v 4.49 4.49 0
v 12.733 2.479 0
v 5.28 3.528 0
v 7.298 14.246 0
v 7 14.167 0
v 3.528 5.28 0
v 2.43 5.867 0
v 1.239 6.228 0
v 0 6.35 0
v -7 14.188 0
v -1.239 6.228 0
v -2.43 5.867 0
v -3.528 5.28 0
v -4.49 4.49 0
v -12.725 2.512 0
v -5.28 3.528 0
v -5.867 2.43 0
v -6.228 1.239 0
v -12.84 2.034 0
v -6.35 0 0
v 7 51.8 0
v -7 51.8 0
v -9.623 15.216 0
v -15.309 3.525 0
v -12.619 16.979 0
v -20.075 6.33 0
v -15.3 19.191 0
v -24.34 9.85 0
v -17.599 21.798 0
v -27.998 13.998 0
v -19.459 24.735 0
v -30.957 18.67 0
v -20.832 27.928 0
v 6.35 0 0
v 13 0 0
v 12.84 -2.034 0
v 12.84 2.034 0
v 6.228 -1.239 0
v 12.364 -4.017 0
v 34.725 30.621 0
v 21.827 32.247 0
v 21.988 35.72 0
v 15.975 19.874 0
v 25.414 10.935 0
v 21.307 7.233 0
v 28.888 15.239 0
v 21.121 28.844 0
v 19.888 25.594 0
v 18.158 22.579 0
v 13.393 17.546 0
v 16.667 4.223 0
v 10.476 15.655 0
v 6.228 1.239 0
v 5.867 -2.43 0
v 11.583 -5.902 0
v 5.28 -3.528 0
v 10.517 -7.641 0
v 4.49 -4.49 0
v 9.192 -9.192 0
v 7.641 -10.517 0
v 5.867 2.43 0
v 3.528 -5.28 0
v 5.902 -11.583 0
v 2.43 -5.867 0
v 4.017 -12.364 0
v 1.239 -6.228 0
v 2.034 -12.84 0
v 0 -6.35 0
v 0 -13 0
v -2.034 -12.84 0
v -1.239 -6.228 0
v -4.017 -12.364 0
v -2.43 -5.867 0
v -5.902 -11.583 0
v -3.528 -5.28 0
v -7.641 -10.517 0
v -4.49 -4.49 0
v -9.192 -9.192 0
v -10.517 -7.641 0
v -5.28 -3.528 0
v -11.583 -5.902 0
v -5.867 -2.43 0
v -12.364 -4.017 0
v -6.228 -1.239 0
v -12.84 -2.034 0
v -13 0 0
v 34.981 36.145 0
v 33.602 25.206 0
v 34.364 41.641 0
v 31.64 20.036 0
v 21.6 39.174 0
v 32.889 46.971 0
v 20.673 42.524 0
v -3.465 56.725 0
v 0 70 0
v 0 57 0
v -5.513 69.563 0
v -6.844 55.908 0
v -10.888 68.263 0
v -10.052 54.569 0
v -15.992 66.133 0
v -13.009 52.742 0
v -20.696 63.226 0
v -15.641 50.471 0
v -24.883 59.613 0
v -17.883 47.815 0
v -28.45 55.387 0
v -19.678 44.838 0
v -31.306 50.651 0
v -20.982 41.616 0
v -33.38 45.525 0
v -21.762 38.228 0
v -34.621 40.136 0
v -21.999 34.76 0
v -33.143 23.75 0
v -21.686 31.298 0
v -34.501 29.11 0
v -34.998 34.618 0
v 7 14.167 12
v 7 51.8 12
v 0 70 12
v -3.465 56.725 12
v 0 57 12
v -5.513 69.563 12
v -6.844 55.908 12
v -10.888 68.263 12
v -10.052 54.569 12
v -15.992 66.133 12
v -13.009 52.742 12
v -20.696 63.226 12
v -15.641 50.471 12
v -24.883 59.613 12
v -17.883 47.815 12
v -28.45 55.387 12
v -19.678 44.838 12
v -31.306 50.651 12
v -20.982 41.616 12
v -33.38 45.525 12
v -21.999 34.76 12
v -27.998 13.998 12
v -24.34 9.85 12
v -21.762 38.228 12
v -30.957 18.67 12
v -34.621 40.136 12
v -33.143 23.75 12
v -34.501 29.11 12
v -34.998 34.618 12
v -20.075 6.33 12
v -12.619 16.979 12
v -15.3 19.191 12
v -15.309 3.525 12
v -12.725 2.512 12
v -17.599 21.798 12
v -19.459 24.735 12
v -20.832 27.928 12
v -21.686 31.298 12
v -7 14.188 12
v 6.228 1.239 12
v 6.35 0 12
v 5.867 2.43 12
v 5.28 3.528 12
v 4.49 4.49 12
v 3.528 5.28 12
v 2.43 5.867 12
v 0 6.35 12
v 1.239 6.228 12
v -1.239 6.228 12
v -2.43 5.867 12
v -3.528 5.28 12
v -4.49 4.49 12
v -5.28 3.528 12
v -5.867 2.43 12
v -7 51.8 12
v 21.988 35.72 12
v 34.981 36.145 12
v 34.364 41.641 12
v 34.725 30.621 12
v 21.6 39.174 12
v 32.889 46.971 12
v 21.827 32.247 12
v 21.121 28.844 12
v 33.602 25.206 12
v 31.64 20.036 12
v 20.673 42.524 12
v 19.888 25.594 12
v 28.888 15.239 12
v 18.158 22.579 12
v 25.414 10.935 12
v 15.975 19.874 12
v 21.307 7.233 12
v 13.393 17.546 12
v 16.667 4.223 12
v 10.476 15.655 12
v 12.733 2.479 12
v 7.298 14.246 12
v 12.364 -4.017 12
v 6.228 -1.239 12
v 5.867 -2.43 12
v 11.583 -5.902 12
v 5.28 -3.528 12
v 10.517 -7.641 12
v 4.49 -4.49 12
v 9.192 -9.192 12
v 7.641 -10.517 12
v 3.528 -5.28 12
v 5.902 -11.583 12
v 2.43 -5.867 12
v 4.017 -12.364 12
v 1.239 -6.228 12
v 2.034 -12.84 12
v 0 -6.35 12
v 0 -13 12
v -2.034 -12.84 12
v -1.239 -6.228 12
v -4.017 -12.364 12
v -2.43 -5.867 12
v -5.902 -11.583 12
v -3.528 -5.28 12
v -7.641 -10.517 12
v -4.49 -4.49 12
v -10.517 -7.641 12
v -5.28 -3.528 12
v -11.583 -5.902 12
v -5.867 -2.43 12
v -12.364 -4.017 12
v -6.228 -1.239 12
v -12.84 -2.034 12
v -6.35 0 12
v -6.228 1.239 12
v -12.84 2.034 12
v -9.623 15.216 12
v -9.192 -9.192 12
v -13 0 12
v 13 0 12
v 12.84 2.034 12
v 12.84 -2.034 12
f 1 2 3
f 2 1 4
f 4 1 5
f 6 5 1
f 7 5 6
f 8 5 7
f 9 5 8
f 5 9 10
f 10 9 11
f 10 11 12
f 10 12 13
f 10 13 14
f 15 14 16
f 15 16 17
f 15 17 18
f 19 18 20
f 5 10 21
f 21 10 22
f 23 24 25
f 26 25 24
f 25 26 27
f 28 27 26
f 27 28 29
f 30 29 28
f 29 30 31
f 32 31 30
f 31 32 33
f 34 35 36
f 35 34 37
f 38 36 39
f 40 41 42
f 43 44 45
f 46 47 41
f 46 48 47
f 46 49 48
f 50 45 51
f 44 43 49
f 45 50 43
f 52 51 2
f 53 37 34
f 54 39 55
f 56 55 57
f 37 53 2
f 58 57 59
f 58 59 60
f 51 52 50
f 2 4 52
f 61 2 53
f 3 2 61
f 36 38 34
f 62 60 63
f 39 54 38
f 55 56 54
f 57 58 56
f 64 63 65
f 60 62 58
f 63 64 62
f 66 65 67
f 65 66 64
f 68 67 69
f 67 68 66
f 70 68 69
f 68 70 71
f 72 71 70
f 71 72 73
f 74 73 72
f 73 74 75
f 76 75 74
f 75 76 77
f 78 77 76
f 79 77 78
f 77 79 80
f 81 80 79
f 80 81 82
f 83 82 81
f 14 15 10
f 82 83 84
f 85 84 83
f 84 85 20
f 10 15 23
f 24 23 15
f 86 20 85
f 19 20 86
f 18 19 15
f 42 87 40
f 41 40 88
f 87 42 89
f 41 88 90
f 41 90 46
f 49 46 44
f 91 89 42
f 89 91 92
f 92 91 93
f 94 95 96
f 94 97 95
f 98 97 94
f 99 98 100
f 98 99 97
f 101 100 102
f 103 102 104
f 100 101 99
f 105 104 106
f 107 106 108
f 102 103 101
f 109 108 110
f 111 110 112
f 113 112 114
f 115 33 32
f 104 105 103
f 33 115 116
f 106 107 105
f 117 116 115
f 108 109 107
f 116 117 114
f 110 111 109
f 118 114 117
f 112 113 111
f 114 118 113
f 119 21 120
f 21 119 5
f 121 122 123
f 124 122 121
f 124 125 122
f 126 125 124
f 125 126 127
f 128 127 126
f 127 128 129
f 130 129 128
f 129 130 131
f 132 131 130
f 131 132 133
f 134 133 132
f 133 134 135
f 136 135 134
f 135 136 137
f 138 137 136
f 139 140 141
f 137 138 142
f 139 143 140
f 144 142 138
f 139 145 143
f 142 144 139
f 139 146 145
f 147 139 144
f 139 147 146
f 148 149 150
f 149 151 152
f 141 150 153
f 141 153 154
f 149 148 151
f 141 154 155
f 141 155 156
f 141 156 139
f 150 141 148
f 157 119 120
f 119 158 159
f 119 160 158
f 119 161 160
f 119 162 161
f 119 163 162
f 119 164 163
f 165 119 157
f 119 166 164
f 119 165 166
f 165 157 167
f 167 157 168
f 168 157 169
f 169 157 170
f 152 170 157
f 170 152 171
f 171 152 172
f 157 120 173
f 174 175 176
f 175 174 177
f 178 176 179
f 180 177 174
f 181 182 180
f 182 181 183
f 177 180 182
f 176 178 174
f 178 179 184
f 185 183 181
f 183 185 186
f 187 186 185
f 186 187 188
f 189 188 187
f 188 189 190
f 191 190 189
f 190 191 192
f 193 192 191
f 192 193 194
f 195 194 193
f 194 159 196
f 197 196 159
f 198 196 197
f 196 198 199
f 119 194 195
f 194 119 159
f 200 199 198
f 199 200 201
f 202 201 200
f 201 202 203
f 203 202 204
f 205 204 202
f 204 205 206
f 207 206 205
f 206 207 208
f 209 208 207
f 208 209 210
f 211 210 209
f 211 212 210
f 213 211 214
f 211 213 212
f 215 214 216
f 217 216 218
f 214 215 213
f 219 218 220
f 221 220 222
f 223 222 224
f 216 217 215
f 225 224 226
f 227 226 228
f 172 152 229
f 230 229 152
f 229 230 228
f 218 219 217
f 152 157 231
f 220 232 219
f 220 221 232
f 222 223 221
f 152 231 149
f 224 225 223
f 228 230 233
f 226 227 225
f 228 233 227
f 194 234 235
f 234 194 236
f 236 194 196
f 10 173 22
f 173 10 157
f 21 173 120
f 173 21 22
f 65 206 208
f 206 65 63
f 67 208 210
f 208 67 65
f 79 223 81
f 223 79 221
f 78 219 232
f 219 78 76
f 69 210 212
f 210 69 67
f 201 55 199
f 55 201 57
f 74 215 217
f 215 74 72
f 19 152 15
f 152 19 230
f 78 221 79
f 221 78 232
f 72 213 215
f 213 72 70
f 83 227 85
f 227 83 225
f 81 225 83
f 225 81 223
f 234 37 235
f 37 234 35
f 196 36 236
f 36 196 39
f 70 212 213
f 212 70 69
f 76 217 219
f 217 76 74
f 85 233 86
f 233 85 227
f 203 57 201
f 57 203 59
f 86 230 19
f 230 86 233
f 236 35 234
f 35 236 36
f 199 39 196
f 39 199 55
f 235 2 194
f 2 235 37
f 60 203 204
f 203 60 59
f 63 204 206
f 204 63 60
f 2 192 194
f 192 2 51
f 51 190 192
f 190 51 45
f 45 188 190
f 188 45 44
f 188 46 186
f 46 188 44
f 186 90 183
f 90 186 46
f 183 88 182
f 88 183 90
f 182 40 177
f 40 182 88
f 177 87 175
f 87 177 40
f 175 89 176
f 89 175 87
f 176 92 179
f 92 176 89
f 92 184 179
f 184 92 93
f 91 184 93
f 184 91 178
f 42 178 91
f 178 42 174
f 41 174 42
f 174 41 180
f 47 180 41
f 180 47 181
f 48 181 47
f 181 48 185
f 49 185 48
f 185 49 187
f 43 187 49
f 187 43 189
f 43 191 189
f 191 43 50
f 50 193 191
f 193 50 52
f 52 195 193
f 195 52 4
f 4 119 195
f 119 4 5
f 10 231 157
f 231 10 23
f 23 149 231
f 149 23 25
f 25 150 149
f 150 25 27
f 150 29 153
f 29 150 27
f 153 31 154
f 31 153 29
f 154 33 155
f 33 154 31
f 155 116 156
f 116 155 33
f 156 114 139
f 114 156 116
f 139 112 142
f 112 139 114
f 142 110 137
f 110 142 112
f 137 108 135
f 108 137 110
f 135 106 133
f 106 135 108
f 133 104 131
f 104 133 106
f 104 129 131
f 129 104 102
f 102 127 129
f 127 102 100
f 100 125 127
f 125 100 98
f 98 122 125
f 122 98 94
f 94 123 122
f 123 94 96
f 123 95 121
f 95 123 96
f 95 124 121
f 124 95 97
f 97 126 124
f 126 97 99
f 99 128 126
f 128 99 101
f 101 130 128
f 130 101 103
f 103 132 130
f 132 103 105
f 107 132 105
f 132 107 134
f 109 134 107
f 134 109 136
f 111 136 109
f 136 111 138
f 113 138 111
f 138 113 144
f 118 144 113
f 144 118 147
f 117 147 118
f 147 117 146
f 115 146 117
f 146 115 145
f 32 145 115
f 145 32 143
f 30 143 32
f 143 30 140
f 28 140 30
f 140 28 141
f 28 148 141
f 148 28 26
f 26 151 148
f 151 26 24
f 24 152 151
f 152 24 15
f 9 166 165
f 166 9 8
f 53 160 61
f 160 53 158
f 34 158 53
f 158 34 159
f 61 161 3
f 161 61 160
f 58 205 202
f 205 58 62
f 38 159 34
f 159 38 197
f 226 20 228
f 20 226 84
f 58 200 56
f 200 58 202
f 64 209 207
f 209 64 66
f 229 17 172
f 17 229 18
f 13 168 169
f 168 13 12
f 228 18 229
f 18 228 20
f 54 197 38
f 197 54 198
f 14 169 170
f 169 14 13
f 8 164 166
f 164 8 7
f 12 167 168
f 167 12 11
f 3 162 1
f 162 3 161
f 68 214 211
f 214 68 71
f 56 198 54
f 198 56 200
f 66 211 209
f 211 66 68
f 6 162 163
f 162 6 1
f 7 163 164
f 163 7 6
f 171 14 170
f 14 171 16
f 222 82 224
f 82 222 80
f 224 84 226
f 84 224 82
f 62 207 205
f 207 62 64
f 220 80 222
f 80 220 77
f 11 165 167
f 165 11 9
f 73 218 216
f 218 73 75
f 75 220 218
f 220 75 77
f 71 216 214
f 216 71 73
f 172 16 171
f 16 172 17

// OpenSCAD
$fn = 32;

// ----------------------------------------------------------------------
// Hook: 70 mm shank into a 22 mm curl, 12 mm thick
// ----------------------------------------------------------------------

// --- parameters (mm) ---
shank_len = 70;           // shank length from the boss centre
shank_w = 14;             // shank width
boss_d = 26;              // boss diameter
bore_d = 12.7;            // boss bore
curl_in = 22;             // curl inner radius
curl_out = 35;            // curl outer radius
curl_sweep = 290;         // curl sweep angle
hook_t = 12;              // hook thickness

shank_profile = [[-7, 51.8], [7, 51.8], [7, 11], [-7, 11]];
boss_profile = [[13, 0], [12.84, 2.034], [12.364, 4.017], [11.583, 5.902], [10.517, 7.641], [9.192, 9.192], [7.641, 10.517], [5.902, 11.583], [4.017, 12.364], [2.034, 12.84], [0, 13], [-2.034, 12.84], [-4.017, 12.364], [-5.902, 11.583], [-7.641, 10.517], [-9.192, 9.192], [-10.517, 7.641], [-11.583, 5.902], [-12.364, 4.017], [-12.84, 2.034], [-13, 0], [-12.84, -2.034], [-12.364, -4.017], [-11.583, -5.902], [-10.517, -7.641], [-9.192, -9.192], [-7.641, -10.517], [-5.902, -11.583], [-4.017, -12.364], [-2.034, -12.84], [0, -13], [2.034, -12.84], [4.017, -12.364], [5.902, -11.583], [7.641, -10.517], [9.192, -9.192], [10.517, -7.641], [11.583, -5.902], [12.364, -4.017], [12.84, -2.034]];
curl_profile = [[0, 70], [-5.513, 69.563], [-10.888, 68.263], [-15.992, 66.133], [-20.696, 63.226], [-24.883, 59.613], [-28.45, 55.387], [-31.306, 50.651], [-33.38, 45.525], [-34.621, 40.136], [-34.998, 34.618], [-34.501, 29.11], [-33.143, 23.75], [-30.957, 18.67], [-27.998, 13.998], [-24.34, 9.85], [-20.075, 6.33], [-15.309, 3.525], [-10.16, 1.507], [-4.758, 0.325], [0.764, 0.008], [6.266, 0.565], [11.611, 1.982], [16.667, 4.223], [21.307, 7.233], [25.414, 10.935], [28.888, 15.239], [31.64, 20.036], [33.602, 25.206], [34.725, 30.621], [34.981, 36.145], [34.364, 41.641], [32.889, 46.971], [20.673, 42.524], [21.6, 39.174], [21.988, 35.72], [21.827, 32.247], [21.121, 28.844], [19.888, 25.594], [18.158, 22.579], [15.975, 19.874], [13.393, 17.546], [10.476, 15.655], [7.298, 14.246], [3.938, 13.355], [0.48, 13.005], [-2.99, 13.204], [-6.386, 13.947], [-9.623, 15.216], [-12.619, 16.979], [-15.3, 19.191], [-17.599, 21.798], [-19.459, 24.735], [-20.832, 27.928], [-21.686, 31.298], [-21.999, 34.76], [-21.762, 38.228], [-20.982, 41.616], [-19.678, 44.838], [-17.883, 47.815], [-15.641, 50.471], [-13.009, 52.742], [-10.052, 54.569], [-6.844, 55.908], [-3.465, 56.725], [0, 57]];

difference() {
  union() {
    /* three overlapping outlines: shank, boss and the smooth curl */
    linear_extrude(height = hook_t) polygon(shank_profile);
    linear_extrude(height = hook_t) polygon(boss_profile);
    linear_extrude(height = hook_t) polygon(curl_profile);
  }
  translate([0, 0, -2.5]) cylinder(h = hook_t + 5, d = bore_d);
}
